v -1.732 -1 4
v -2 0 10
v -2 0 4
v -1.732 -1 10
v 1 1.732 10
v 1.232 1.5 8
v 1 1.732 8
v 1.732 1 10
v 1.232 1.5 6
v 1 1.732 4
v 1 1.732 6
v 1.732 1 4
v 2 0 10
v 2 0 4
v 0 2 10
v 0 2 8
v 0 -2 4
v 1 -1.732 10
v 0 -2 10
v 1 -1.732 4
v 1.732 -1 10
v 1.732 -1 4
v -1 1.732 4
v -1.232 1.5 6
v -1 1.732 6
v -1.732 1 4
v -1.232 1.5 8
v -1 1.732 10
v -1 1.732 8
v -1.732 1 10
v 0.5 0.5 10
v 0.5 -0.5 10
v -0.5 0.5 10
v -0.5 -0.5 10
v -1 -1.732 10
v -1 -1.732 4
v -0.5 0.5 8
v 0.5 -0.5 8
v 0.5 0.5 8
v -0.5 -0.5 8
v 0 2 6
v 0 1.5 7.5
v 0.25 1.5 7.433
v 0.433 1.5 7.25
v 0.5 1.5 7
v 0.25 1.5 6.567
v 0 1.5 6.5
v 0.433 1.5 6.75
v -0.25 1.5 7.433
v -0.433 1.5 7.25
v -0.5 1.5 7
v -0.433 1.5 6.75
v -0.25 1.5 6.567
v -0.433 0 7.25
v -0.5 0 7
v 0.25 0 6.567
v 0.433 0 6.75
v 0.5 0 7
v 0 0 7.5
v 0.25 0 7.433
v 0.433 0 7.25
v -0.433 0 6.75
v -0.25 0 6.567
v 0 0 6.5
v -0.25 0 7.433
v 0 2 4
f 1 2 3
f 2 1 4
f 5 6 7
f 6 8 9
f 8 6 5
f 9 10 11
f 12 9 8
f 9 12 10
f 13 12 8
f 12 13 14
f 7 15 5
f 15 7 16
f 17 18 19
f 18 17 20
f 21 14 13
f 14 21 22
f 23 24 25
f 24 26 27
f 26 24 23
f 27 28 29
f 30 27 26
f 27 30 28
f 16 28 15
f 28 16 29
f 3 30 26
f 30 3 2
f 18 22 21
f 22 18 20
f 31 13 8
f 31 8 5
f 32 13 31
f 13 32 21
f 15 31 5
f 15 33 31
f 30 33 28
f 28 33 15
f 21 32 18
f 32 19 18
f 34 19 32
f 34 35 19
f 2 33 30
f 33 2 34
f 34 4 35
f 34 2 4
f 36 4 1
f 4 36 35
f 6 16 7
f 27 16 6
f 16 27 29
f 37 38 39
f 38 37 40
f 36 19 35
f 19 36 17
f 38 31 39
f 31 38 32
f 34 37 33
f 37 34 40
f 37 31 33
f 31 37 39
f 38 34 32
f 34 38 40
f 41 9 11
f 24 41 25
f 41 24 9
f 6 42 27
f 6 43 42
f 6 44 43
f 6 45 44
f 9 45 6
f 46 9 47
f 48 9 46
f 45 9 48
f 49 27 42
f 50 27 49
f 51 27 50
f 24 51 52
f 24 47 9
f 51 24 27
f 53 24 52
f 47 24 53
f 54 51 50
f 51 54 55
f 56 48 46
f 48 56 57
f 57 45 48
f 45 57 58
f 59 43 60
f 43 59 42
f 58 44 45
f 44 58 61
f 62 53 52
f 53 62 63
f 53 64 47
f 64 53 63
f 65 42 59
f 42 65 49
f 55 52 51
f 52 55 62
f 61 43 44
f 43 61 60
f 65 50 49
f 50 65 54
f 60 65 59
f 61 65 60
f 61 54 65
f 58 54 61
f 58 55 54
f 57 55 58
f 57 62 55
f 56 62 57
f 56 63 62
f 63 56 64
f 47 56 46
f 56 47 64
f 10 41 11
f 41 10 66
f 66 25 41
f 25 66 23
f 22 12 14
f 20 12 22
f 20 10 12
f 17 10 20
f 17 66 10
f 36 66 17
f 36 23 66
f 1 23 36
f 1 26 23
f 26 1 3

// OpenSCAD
// global variables ##################

$fn = 12;
base1 = 2;
crystal = [base1,base1/2]; //h,d

// parts #############################

module core() {
  union() {
    translate([0,0,base1*2]) difference() {
      cylinder(h=base1,r=base1,center=false);
      corr = crystal[1]/2;
      translate([-corr,-corr,-base1/4]) {
        cube([crystal[1],crystal[1],crystal[0]+base1/2],center=false);
      }
    }
    translate([0,0,base1]) difference() {
      cylinder(h=base1,r=base1,center=false);
      translate([-base1,base1*0.75,-base1/4]) {
        cube([base1*2,base1/4,base1+base1/2],center=false);
      }
      translate([0,0,base1/2]) rotate([-90,0,0]) cylinder(h=base1,d=base1/2,center=false);
    }
    cylinder(h=base1,r=base1,center=false);
  }
}

module wheel() {
  //
  //
}

module front_wheel_connector() {
  //
  //cb
  //
  //cube([],center=true);
  //
}

// ASSEMBLY ##########################

module assembly() {
  //
  translate([0,0,2*base1]) core();
  //
  //
}

assembly();
